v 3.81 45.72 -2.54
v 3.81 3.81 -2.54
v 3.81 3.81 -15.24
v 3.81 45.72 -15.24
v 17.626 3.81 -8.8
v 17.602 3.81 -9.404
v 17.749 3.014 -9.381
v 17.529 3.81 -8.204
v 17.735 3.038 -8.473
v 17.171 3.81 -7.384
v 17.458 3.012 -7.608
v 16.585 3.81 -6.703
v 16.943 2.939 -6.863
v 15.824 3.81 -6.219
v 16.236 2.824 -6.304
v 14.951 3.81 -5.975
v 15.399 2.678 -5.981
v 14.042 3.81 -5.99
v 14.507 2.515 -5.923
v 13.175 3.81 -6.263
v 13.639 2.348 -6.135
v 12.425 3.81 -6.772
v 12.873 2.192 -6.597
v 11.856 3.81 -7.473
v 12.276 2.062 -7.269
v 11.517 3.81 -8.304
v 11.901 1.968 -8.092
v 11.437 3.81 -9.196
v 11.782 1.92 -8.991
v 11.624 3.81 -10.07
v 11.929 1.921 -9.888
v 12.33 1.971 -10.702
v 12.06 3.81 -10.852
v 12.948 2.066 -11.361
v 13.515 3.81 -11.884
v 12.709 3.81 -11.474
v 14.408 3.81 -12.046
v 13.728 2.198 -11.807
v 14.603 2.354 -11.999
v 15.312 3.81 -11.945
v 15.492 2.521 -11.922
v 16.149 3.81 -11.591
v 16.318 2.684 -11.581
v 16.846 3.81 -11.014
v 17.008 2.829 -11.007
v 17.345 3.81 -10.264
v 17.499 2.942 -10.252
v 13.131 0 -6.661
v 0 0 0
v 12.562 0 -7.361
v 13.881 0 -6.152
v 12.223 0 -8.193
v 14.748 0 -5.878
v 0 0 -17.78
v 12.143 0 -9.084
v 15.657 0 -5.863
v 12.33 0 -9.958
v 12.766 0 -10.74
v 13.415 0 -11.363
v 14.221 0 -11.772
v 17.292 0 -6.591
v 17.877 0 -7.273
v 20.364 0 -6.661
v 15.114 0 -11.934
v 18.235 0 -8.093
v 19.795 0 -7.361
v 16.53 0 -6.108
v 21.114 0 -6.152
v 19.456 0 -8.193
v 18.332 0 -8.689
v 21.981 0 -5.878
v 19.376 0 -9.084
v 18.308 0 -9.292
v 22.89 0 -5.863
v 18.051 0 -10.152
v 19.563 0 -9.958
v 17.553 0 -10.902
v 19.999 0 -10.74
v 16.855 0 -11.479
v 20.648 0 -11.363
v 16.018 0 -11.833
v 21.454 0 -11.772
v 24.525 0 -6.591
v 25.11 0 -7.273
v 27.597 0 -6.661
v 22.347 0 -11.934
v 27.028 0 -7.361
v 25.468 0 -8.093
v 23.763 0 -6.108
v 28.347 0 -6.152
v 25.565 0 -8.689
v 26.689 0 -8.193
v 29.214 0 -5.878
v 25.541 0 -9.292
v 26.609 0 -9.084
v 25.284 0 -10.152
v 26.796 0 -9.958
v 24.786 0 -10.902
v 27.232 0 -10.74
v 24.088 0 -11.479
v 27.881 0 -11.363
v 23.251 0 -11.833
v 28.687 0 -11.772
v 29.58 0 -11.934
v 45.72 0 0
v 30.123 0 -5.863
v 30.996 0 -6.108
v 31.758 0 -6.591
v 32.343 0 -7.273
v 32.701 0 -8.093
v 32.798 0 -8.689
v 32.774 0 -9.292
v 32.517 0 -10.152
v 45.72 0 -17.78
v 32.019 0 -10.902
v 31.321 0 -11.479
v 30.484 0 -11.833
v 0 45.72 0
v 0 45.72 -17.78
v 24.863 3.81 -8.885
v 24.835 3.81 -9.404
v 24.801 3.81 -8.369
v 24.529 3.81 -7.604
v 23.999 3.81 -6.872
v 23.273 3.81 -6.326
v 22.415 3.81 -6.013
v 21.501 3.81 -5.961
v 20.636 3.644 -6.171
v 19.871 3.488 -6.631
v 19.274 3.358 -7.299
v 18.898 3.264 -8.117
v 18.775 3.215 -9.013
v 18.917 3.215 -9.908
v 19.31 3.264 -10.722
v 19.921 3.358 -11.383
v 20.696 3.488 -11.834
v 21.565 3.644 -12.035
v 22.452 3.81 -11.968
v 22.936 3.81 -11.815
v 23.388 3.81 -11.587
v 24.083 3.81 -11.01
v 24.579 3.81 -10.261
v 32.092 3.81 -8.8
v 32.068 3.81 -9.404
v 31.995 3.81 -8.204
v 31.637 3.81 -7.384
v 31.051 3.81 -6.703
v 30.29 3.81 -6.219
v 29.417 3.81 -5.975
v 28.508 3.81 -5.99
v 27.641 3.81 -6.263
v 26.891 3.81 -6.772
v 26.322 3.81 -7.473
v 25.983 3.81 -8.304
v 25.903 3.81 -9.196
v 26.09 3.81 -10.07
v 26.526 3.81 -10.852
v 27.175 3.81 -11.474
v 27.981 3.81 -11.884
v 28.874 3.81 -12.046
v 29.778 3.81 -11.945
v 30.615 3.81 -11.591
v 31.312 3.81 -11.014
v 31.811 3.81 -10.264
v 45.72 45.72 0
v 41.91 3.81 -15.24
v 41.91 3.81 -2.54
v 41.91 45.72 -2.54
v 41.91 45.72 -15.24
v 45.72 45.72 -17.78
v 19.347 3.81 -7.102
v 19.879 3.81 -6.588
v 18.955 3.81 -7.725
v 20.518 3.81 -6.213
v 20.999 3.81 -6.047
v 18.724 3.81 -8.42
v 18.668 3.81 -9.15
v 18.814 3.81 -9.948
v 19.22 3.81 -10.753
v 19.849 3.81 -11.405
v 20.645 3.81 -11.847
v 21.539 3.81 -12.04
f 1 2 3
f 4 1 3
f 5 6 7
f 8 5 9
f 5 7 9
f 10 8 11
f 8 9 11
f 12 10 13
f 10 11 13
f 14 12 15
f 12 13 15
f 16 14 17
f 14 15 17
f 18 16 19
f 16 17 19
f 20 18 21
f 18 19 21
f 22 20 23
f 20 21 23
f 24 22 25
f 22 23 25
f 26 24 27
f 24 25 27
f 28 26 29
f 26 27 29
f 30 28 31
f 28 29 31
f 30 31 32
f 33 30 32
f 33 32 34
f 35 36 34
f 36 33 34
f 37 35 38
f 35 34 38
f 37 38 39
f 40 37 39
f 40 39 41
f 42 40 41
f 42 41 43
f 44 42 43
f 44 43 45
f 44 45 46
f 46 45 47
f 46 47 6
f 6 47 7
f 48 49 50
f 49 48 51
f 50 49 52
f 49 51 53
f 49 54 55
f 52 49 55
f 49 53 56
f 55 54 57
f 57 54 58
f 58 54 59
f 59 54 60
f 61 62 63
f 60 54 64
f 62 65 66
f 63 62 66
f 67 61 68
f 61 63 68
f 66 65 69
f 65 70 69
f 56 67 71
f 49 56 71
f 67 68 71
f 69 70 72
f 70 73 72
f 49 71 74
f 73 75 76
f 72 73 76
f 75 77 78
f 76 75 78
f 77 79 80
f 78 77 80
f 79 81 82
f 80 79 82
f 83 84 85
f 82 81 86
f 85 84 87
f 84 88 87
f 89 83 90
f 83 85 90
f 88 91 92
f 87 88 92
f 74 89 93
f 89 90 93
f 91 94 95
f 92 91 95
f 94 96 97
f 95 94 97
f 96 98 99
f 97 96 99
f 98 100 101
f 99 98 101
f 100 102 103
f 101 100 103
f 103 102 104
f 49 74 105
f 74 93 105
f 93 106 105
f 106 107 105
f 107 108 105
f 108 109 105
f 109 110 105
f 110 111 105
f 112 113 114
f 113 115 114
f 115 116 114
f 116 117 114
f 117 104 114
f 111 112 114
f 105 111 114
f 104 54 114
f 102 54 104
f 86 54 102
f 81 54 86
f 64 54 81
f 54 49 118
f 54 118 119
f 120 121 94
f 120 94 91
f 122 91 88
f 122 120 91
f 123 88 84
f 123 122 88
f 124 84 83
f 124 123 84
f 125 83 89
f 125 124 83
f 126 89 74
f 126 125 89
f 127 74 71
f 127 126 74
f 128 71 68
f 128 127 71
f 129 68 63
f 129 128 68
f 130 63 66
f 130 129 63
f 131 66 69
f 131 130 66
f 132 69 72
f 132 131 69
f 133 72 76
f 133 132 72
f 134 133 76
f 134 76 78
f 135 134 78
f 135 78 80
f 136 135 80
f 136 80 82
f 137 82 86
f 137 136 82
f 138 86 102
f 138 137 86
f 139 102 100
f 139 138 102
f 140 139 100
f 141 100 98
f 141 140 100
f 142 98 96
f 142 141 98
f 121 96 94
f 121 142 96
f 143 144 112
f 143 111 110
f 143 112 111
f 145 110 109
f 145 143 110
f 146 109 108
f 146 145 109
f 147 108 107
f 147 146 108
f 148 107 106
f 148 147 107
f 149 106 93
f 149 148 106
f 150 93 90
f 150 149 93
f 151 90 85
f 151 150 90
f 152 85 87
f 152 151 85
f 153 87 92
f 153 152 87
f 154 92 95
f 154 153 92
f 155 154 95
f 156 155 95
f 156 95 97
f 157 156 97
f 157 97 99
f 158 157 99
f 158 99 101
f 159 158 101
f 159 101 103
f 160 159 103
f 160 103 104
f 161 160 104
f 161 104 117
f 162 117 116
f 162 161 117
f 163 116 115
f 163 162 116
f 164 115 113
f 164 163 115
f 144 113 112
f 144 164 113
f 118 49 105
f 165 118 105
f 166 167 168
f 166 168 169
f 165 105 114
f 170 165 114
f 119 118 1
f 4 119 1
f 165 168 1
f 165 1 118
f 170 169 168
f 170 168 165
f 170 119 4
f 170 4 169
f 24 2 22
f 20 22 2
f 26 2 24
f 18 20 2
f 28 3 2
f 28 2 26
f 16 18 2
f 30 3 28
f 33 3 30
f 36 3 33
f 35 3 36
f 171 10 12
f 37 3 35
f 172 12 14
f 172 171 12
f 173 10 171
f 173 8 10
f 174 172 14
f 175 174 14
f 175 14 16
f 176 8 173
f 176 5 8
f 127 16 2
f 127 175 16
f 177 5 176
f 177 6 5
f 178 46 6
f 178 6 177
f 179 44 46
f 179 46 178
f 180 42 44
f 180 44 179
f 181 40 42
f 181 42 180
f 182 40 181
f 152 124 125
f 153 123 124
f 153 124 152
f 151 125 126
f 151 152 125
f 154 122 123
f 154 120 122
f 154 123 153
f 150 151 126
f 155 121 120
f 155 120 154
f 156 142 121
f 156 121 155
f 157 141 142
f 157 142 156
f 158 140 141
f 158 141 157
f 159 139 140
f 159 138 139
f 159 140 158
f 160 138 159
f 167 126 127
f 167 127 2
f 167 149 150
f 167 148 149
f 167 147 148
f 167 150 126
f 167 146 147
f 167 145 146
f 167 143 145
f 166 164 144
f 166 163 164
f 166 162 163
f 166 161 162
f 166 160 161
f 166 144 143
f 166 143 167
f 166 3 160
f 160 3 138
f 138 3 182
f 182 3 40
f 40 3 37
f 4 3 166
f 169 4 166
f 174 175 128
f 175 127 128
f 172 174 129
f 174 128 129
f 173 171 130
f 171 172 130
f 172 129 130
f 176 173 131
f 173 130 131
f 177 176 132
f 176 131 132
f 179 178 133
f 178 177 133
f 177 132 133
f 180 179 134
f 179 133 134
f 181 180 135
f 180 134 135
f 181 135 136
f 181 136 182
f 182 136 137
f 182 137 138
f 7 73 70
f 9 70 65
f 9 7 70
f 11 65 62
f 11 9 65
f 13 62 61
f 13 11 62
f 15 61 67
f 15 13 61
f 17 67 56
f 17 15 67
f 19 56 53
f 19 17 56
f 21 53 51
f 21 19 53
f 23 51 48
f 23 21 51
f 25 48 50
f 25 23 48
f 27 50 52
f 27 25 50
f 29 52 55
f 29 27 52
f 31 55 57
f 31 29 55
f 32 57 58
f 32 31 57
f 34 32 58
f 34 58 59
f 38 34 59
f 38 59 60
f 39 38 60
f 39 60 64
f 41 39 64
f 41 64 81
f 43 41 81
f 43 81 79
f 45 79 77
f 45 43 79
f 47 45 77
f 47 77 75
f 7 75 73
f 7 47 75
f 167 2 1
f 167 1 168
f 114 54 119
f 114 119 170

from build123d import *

# Parameters (mm, degrees)
SKETCH1_W               = 45.72
SKETCH1_H               = 17.78
BOSS_EXTRUDE1_DEPTH     = 45.72
SKETCH2_W               = 38.1
SKETCH2_H               = 12.7
CUT_EXTRUDE1_DEPTH      = 41.91
SKETCH6_R               = 3.048
CUT_EXTRUDE2_DEPTH      = 9.328339826
CUT_EXTRUDE2_DEPTH_BACK = 15.24


with BuildPart() as part:
    # Sketch1 → Boss-Extrude1 (new body)
    with BuildSketch(Plane(origin=(0, 0, 0), x_dir=(1, 0, 0), z_dir=(0, 1, 0))):
        with Locations((22.86, 8.89)):
            Rectangle(SKETCH1_W, SKETCH1_H)
    extrude(amount=BOSS_EXTRUDE1_DEPTH)

    # Sketch2 → Cut-Extrude1 (cut)
    with BuildSketch(Plane(origin=(0, 45.72, 0), x_dir=(1, 0, 0), z_dir=(0, 1, 0))):
        with Locations((22.86, 8.89)):
            Rectangle(SKETCH2_W, SKETCH2_H)
    extrude(amount=-CUT_EXTRUDE1_DEPTH, mode=Mode.SUBTRACT)

    # Sketch6 → Cut-Extrude2 (cut, two sides)
    with BuildSketch(Plane(origin=(0, 0, 0), x_dir=(0.974501657, 0.176548089, -0.138482102), z_dir=(0.182159664, -0.982845594, 0.028851256))) as cut_extrude2_sk:
        with Locations((23.128298386, -5.852866773)):
            Circle(SKETCH6_R)
        with Locations((16.079712461, -6.800485078)):
            Circle(SKETCH6_R)
        with Locations((30.176884312, -4.905248468)):
            Circle(SKETCH6_R)
    extrude(amount=CUT_EXTRUDE2_DEPTH, mode=Mode.SUBTRACT)
    extrude(cut_extrude2_sk.sketch, amount=-CUT_EXTRUDE2_DEPTH_BACK, mode=Mode.SUBTRACT)


solid = part.part
